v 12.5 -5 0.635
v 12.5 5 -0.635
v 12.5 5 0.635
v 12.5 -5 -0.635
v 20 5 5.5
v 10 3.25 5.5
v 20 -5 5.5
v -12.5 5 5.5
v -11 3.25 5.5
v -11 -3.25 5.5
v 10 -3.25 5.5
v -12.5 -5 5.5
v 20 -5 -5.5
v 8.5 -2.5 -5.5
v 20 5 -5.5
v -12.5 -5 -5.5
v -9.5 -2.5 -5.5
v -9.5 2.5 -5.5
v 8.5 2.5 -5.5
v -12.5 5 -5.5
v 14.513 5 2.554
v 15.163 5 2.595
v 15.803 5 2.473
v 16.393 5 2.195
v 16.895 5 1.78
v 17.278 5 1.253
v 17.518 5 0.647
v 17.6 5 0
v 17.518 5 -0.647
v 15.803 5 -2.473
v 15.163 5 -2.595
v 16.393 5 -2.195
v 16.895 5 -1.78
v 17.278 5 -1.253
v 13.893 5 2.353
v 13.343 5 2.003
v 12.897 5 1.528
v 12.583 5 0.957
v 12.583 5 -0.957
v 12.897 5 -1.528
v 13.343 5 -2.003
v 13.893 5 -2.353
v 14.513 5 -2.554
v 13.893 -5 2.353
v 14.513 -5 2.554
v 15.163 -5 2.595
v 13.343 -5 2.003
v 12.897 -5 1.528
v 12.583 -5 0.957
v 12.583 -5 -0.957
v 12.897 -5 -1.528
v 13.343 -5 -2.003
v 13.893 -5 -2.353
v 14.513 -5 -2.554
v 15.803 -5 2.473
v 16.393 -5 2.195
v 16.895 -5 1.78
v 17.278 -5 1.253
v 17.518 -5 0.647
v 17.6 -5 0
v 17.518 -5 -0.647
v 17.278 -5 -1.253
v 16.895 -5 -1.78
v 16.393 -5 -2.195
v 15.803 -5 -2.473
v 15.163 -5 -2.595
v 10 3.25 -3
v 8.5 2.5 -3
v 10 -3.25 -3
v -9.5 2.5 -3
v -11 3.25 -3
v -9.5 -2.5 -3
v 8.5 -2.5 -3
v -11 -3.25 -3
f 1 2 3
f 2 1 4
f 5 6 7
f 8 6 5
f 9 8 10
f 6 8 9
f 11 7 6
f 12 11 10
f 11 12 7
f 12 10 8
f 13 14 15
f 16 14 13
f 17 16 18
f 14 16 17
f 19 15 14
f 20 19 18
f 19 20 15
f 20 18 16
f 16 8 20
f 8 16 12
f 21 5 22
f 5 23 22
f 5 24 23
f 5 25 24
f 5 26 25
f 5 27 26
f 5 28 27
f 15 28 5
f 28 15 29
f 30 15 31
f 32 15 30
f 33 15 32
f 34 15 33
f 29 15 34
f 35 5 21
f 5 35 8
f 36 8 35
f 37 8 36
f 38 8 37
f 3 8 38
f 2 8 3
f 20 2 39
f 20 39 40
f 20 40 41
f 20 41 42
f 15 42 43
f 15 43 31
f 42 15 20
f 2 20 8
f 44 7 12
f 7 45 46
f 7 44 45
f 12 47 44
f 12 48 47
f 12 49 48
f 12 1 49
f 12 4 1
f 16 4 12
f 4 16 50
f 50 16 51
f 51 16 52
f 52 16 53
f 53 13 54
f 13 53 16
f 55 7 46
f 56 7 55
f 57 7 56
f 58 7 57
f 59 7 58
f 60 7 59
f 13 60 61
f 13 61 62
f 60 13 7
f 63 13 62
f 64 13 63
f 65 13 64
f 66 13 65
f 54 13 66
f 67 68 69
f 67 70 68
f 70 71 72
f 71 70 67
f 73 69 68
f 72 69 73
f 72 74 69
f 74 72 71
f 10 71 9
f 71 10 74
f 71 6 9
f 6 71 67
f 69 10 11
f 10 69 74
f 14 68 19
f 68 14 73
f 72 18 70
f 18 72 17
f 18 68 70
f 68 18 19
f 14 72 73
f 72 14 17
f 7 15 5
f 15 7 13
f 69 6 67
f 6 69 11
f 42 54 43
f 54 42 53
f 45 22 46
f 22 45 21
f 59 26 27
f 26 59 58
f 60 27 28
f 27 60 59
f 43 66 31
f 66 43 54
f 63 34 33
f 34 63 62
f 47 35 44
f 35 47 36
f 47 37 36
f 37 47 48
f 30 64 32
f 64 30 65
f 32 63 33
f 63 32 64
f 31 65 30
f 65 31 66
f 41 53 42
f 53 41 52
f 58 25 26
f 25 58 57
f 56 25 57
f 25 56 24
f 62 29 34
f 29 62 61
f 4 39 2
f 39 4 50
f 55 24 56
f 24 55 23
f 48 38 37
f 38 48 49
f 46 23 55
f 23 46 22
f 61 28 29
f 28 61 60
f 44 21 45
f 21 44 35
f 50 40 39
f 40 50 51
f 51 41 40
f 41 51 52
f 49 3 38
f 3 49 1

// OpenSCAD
mount_point();

module mount_point(){
    difference(){
        cube([25, 10, 11], center=true);
        translate([0, 0, 2]) cube([22, 6.5, 10], center=true);
        translate([-0.5,0,-(11/2) - 0.5]) cube([18,5,12], center=true);
    }    
    
    difference(){
        translate([15,0,0]) cube([10,10,11], center=true);
        translate([15, 0, 0]) rotate([90,0,0]) cylinder(d=5.2, h=12, $fn=25, center=true);
    }
    
}
